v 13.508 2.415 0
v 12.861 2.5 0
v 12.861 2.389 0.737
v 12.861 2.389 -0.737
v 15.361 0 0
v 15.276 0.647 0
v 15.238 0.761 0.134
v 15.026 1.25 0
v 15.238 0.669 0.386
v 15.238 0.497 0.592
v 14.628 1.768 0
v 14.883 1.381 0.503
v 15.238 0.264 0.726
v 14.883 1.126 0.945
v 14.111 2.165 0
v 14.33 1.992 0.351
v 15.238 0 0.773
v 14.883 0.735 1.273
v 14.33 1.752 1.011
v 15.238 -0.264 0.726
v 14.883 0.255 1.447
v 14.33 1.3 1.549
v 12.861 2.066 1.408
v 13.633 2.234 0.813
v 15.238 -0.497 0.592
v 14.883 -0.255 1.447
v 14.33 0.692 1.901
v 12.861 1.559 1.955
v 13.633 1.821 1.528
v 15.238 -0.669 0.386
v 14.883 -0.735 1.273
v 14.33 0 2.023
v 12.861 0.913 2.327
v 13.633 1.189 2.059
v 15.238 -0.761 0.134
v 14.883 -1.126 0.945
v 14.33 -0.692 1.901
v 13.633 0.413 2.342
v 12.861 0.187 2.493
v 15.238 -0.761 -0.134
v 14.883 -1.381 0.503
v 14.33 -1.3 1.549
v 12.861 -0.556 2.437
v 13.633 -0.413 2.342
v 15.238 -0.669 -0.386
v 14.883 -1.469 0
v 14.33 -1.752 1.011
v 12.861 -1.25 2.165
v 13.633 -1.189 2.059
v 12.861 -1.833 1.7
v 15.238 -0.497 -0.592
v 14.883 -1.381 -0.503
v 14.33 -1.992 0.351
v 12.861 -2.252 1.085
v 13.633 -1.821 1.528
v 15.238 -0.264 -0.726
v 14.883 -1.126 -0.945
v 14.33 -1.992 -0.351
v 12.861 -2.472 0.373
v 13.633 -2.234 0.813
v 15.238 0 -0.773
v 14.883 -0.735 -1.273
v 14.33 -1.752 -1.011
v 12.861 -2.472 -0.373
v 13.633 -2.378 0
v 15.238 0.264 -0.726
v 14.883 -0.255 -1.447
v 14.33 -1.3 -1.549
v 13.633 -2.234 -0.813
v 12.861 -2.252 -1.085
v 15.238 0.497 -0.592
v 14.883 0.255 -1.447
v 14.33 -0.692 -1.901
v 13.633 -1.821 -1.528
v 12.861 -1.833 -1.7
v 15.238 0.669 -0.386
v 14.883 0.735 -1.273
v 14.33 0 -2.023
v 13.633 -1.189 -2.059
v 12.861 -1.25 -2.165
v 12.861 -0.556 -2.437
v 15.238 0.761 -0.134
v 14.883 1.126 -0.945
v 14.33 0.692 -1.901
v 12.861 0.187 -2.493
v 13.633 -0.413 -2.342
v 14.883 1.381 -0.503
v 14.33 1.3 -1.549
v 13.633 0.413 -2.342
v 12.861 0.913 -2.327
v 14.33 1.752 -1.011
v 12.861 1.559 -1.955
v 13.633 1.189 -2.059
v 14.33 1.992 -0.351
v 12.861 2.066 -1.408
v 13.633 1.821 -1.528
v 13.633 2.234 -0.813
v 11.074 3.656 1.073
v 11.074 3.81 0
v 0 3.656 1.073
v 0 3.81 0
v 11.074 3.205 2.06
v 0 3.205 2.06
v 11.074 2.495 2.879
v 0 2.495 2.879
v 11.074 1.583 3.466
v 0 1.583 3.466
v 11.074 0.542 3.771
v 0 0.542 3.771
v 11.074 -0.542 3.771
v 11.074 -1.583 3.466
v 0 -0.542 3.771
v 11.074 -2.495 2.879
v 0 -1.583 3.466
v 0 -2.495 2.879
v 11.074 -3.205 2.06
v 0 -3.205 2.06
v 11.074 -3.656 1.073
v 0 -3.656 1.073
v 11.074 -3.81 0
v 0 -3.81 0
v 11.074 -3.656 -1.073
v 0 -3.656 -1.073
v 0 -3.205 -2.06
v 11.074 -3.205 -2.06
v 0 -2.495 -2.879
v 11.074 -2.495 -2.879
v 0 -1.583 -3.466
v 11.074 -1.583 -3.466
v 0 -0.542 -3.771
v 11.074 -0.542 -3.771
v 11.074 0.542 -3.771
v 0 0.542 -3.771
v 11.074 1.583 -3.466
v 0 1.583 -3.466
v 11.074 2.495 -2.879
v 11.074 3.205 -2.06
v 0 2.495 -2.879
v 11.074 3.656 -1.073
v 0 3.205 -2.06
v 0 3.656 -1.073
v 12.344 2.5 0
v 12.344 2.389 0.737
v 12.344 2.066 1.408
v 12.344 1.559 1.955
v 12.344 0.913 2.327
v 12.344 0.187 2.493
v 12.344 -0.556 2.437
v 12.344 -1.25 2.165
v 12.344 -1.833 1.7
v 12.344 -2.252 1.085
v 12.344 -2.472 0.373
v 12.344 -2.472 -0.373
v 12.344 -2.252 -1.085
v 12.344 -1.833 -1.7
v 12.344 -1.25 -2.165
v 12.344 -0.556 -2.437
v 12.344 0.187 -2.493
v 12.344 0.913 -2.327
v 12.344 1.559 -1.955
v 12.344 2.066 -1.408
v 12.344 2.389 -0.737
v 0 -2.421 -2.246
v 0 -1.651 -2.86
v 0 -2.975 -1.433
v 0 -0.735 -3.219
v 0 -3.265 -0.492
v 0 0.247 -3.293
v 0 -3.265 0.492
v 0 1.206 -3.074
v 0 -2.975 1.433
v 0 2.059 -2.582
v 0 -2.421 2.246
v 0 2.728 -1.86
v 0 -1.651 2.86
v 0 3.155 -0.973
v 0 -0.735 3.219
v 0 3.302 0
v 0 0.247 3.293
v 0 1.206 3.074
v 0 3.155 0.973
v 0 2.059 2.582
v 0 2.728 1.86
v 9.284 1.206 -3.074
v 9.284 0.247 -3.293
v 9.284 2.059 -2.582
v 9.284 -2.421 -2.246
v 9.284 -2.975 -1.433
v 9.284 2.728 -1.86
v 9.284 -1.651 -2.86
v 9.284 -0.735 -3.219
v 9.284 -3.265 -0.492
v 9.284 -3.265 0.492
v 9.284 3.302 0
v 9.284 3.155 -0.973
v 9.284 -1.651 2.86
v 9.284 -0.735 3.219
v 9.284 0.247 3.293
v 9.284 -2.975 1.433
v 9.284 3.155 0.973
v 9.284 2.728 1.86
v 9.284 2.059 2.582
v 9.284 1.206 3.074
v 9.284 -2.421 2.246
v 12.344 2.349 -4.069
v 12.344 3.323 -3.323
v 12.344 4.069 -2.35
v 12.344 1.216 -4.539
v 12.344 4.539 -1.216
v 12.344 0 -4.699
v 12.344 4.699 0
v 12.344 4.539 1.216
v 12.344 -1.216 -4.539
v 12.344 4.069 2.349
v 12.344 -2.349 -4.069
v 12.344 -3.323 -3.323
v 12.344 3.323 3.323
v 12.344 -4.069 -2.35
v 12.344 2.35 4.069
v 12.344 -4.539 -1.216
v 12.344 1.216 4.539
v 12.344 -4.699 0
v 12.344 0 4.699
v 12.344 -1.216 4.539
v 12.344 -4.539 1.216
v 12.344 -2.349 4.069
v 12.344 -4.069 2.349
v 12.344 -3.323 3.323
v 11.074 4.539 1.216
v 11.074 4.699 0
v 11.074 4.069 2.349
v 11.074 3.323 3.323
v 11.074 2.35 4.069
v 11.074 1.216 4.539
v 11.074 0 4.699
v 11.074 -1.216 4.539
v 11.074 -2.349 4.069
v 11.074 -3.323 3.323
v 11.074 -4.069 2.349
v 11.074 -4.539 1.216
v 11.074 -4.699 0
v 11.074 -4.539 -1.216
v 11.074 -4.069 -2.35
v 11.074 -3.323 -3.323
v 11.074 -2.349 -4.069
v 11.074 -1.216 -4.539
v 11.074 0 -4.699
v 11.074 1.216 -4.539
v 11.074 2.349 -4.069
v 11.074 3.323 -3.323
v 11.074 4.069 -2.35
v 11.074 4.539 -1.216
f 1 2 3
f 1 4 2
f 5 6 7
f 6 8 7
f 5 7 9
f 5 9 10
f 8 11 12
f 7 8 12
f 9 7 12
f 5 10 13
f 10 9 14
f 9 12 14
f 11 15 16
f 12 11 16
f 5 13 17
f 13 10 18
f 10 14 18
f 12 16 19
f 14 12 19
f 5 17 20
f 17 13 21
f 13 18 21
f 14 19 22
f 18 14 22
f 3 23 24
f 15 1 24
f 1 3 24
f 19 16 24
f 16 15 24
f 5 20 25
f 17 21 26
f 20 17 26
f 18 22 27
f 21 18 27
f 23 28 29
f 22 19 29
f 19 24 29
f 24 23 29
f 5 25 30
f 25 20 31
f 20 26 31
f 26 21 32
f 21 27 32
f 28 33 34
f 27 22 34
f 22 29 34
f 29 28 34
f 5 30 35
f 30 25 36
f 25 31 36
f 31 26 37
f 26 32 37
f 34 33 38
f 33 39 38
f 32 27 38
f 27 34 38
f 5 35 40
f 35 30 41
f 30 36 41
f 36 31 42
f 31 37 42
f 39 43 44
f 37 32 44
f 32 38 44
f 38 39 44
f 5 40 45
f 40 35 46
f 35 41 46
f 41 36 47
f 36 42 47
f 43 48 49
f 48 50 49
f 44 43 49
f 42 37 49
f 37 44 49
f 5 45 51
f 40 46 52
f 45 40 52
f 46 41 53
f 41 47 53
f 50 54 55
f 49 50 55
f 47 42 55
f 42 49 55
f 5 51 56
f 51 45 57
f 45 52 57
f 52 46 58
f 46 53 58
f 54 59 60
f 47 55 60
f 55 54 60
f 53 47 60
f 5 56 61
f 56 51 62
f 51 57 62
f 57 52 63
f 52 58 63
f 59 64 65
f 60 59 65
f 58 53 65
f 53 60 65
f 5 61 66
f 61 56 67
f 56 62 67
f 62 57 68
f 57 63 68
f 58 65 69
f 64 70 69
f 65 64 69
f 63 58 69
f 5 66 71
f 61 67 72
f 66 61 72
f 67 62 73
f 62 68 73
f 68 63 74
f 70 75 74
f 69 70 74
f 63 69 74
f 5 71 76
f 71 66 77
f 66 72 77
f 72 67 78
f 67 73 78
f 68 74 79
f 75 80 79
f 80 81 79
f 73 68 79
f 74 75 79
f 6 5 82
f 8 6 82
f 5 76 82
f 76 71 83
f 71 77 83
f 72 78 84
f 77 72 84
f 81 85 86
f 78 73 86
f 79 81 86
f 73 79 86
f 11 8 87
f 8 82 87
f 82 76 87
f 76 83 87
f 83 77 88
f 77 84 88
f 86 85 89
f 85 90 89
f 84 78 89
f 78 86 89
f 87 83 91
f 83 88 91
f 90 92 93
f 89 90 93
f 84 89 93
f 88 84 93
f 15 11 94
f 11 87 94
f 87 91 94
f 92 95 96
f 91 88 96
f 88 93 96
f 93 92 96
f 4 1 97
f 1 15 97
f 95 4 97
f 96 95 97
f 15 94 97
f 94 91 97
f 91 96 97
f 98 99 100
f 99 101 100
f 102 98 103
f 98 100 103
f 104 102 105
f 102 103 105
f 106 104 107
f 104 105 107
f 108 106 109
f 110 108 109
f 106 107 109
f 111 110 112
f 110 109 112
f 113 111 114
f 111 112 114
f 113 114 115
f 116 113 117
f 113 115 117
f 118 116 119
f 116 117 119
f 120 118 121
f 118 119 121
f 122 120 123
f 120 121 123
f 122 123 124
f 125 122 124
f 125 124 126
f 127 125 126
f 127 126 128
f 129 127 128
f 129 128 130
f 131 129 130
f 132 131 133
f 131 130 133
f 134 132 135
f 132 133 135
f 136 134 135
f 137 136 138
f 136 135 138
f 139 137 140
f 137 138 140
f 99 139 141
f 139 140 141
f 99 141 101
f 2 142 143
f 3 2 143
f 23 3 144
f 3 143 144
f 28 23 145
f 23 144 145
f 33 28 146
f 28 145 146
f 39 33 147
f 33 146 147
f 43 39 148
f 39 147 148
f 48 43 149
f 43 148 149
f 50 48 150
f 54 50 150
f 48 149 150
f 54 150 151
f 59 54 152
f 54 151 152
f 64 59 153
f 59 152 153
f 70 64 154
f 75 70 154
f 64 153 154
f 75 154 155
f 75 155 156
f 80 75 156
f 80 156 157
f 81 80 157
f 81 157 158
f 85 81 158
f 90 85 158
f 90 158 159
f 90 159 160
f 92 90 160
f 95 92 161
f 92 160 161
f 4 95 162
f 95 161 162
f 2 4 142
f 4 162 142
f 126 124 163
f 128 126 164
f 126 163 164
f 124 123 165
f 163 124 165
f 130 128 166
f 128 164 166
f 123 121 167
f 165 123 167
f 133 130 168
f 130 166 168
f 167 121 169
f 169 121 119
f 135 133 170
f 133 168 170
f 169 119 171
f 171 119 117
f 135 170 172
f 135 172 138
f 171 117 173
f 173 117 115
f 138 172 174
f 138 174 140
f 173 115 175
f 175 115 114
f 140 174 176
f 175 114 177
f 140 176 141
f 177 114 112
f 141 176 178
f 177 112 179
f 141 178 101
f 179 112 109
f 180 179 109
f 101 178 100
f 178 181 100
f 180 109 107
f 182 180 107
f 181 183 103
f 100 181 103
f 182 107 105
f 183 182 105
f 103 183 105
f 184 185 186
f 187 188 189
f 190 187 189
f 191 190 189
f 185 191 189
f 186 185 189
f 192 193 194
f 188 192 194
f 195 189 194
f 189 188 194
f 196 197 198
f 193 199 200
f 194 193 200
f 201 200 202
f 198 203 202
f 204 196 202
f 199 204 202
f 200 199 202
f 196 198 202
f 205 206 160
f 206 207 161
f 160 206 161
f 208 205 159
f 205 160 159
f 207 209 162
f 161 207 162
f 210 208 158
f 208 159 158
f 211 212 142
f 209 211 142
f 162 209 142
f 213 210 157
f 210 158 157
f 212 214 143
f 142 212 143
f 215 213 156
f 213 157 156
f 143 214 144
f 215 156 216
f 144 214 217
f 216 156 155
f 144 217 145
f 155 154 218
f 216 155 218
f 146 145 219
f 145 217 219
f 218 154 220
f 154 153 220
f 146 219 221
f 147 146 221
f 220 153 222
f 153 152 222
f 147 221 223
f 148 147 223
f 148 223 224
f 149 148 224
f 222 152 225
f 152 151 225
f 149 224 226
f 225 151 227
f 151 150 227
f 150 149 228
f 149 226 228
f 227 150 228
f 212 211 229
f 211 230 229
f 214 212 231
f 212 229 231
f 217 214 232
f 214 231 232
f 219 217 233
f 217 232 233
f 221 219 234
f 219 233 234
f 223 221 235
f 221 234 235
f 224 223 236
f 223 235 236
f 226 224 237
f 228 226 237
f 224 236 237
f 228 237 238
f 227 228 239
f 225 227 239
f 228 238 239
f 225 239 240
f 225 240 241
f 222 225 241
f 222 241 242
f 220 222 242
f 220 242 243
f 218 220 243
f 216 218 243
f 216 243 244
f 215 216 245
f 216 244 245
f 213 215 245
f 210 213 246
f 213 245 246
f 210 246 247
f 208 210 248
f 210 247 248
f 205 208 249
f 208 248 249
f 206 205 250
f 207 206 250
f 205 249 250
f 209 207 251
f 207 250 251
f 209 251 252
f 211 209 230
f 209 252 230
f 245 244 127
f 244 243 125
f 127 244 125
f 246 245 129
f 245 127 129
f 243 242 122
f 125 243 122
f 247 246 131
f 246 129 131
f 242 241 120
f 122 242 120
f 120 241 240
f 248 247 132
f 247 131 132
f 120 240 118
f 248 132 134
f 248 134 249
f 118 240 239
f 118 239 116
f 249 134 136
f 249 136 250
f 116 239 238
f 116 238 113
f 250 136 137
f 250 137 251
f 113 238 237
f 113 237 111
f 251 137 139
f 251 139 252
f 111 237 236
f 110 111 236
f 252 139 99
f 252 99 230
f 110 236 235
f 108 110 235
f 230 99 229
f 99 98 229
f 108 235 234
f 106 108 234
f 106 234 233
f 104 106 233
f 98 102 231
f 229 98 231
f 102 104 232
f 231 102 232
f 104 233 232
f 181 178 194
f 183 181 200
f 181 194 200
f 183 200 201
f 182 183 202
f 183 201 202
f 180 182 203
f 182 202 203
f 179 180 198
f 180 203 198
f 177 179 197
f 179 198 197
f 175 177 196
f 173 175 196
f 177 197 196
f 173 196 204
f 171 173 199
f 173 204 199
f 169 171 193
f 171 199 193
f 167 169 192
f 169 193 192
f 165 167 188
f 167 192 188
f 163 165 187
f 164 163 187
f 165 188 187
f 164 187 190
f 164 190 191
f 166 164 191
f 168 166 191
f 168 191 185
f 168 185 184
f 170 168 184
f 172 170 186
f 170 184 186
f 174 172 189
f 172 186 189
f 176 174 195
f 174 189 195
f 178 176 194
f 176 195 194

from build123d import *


with BuildPart() as part:
    # Sketch1 → Revolve1 (revolve)
    with BuildSketch(Plane.XY):
        Polygon((12.3444, 4.699), (11.0744, 4.699), (11.0744, 3.81), (0, 3.81), (0, 3.302), (10.16, 3.302), (10.16, 2.5), (12.3444, 2.5), align=None)
    revolve(axis=Axis((0, 0, 0), (1, 0, 0)))

    # Sketch7 → Revolve4 (revolve)
    with BuildSketch(Plane.XY):
        with BuildLine():
            Line((10.16, 3.302), (9.2837, 3.302))
            Line((9.2837, 3.302), (9.2837, 0))
            Line((9.2837, 0), (12.86069262, 0))
            Line((12.86069262, 0), (15.36069262, 0))
            ThreePointArc((15.36069262, 0), (14.628459573, 1.767766953), (12.86069262, 2.5))
            Line((12.86069262, 2.5), (10.16, 2.5))
            Line((10.16, 2.5), (10.16, 3.302))
        make_face()
    revolve(axis=Axis((12.86069262, 0, 0), (1, 0, 0)))


solid = part.part
